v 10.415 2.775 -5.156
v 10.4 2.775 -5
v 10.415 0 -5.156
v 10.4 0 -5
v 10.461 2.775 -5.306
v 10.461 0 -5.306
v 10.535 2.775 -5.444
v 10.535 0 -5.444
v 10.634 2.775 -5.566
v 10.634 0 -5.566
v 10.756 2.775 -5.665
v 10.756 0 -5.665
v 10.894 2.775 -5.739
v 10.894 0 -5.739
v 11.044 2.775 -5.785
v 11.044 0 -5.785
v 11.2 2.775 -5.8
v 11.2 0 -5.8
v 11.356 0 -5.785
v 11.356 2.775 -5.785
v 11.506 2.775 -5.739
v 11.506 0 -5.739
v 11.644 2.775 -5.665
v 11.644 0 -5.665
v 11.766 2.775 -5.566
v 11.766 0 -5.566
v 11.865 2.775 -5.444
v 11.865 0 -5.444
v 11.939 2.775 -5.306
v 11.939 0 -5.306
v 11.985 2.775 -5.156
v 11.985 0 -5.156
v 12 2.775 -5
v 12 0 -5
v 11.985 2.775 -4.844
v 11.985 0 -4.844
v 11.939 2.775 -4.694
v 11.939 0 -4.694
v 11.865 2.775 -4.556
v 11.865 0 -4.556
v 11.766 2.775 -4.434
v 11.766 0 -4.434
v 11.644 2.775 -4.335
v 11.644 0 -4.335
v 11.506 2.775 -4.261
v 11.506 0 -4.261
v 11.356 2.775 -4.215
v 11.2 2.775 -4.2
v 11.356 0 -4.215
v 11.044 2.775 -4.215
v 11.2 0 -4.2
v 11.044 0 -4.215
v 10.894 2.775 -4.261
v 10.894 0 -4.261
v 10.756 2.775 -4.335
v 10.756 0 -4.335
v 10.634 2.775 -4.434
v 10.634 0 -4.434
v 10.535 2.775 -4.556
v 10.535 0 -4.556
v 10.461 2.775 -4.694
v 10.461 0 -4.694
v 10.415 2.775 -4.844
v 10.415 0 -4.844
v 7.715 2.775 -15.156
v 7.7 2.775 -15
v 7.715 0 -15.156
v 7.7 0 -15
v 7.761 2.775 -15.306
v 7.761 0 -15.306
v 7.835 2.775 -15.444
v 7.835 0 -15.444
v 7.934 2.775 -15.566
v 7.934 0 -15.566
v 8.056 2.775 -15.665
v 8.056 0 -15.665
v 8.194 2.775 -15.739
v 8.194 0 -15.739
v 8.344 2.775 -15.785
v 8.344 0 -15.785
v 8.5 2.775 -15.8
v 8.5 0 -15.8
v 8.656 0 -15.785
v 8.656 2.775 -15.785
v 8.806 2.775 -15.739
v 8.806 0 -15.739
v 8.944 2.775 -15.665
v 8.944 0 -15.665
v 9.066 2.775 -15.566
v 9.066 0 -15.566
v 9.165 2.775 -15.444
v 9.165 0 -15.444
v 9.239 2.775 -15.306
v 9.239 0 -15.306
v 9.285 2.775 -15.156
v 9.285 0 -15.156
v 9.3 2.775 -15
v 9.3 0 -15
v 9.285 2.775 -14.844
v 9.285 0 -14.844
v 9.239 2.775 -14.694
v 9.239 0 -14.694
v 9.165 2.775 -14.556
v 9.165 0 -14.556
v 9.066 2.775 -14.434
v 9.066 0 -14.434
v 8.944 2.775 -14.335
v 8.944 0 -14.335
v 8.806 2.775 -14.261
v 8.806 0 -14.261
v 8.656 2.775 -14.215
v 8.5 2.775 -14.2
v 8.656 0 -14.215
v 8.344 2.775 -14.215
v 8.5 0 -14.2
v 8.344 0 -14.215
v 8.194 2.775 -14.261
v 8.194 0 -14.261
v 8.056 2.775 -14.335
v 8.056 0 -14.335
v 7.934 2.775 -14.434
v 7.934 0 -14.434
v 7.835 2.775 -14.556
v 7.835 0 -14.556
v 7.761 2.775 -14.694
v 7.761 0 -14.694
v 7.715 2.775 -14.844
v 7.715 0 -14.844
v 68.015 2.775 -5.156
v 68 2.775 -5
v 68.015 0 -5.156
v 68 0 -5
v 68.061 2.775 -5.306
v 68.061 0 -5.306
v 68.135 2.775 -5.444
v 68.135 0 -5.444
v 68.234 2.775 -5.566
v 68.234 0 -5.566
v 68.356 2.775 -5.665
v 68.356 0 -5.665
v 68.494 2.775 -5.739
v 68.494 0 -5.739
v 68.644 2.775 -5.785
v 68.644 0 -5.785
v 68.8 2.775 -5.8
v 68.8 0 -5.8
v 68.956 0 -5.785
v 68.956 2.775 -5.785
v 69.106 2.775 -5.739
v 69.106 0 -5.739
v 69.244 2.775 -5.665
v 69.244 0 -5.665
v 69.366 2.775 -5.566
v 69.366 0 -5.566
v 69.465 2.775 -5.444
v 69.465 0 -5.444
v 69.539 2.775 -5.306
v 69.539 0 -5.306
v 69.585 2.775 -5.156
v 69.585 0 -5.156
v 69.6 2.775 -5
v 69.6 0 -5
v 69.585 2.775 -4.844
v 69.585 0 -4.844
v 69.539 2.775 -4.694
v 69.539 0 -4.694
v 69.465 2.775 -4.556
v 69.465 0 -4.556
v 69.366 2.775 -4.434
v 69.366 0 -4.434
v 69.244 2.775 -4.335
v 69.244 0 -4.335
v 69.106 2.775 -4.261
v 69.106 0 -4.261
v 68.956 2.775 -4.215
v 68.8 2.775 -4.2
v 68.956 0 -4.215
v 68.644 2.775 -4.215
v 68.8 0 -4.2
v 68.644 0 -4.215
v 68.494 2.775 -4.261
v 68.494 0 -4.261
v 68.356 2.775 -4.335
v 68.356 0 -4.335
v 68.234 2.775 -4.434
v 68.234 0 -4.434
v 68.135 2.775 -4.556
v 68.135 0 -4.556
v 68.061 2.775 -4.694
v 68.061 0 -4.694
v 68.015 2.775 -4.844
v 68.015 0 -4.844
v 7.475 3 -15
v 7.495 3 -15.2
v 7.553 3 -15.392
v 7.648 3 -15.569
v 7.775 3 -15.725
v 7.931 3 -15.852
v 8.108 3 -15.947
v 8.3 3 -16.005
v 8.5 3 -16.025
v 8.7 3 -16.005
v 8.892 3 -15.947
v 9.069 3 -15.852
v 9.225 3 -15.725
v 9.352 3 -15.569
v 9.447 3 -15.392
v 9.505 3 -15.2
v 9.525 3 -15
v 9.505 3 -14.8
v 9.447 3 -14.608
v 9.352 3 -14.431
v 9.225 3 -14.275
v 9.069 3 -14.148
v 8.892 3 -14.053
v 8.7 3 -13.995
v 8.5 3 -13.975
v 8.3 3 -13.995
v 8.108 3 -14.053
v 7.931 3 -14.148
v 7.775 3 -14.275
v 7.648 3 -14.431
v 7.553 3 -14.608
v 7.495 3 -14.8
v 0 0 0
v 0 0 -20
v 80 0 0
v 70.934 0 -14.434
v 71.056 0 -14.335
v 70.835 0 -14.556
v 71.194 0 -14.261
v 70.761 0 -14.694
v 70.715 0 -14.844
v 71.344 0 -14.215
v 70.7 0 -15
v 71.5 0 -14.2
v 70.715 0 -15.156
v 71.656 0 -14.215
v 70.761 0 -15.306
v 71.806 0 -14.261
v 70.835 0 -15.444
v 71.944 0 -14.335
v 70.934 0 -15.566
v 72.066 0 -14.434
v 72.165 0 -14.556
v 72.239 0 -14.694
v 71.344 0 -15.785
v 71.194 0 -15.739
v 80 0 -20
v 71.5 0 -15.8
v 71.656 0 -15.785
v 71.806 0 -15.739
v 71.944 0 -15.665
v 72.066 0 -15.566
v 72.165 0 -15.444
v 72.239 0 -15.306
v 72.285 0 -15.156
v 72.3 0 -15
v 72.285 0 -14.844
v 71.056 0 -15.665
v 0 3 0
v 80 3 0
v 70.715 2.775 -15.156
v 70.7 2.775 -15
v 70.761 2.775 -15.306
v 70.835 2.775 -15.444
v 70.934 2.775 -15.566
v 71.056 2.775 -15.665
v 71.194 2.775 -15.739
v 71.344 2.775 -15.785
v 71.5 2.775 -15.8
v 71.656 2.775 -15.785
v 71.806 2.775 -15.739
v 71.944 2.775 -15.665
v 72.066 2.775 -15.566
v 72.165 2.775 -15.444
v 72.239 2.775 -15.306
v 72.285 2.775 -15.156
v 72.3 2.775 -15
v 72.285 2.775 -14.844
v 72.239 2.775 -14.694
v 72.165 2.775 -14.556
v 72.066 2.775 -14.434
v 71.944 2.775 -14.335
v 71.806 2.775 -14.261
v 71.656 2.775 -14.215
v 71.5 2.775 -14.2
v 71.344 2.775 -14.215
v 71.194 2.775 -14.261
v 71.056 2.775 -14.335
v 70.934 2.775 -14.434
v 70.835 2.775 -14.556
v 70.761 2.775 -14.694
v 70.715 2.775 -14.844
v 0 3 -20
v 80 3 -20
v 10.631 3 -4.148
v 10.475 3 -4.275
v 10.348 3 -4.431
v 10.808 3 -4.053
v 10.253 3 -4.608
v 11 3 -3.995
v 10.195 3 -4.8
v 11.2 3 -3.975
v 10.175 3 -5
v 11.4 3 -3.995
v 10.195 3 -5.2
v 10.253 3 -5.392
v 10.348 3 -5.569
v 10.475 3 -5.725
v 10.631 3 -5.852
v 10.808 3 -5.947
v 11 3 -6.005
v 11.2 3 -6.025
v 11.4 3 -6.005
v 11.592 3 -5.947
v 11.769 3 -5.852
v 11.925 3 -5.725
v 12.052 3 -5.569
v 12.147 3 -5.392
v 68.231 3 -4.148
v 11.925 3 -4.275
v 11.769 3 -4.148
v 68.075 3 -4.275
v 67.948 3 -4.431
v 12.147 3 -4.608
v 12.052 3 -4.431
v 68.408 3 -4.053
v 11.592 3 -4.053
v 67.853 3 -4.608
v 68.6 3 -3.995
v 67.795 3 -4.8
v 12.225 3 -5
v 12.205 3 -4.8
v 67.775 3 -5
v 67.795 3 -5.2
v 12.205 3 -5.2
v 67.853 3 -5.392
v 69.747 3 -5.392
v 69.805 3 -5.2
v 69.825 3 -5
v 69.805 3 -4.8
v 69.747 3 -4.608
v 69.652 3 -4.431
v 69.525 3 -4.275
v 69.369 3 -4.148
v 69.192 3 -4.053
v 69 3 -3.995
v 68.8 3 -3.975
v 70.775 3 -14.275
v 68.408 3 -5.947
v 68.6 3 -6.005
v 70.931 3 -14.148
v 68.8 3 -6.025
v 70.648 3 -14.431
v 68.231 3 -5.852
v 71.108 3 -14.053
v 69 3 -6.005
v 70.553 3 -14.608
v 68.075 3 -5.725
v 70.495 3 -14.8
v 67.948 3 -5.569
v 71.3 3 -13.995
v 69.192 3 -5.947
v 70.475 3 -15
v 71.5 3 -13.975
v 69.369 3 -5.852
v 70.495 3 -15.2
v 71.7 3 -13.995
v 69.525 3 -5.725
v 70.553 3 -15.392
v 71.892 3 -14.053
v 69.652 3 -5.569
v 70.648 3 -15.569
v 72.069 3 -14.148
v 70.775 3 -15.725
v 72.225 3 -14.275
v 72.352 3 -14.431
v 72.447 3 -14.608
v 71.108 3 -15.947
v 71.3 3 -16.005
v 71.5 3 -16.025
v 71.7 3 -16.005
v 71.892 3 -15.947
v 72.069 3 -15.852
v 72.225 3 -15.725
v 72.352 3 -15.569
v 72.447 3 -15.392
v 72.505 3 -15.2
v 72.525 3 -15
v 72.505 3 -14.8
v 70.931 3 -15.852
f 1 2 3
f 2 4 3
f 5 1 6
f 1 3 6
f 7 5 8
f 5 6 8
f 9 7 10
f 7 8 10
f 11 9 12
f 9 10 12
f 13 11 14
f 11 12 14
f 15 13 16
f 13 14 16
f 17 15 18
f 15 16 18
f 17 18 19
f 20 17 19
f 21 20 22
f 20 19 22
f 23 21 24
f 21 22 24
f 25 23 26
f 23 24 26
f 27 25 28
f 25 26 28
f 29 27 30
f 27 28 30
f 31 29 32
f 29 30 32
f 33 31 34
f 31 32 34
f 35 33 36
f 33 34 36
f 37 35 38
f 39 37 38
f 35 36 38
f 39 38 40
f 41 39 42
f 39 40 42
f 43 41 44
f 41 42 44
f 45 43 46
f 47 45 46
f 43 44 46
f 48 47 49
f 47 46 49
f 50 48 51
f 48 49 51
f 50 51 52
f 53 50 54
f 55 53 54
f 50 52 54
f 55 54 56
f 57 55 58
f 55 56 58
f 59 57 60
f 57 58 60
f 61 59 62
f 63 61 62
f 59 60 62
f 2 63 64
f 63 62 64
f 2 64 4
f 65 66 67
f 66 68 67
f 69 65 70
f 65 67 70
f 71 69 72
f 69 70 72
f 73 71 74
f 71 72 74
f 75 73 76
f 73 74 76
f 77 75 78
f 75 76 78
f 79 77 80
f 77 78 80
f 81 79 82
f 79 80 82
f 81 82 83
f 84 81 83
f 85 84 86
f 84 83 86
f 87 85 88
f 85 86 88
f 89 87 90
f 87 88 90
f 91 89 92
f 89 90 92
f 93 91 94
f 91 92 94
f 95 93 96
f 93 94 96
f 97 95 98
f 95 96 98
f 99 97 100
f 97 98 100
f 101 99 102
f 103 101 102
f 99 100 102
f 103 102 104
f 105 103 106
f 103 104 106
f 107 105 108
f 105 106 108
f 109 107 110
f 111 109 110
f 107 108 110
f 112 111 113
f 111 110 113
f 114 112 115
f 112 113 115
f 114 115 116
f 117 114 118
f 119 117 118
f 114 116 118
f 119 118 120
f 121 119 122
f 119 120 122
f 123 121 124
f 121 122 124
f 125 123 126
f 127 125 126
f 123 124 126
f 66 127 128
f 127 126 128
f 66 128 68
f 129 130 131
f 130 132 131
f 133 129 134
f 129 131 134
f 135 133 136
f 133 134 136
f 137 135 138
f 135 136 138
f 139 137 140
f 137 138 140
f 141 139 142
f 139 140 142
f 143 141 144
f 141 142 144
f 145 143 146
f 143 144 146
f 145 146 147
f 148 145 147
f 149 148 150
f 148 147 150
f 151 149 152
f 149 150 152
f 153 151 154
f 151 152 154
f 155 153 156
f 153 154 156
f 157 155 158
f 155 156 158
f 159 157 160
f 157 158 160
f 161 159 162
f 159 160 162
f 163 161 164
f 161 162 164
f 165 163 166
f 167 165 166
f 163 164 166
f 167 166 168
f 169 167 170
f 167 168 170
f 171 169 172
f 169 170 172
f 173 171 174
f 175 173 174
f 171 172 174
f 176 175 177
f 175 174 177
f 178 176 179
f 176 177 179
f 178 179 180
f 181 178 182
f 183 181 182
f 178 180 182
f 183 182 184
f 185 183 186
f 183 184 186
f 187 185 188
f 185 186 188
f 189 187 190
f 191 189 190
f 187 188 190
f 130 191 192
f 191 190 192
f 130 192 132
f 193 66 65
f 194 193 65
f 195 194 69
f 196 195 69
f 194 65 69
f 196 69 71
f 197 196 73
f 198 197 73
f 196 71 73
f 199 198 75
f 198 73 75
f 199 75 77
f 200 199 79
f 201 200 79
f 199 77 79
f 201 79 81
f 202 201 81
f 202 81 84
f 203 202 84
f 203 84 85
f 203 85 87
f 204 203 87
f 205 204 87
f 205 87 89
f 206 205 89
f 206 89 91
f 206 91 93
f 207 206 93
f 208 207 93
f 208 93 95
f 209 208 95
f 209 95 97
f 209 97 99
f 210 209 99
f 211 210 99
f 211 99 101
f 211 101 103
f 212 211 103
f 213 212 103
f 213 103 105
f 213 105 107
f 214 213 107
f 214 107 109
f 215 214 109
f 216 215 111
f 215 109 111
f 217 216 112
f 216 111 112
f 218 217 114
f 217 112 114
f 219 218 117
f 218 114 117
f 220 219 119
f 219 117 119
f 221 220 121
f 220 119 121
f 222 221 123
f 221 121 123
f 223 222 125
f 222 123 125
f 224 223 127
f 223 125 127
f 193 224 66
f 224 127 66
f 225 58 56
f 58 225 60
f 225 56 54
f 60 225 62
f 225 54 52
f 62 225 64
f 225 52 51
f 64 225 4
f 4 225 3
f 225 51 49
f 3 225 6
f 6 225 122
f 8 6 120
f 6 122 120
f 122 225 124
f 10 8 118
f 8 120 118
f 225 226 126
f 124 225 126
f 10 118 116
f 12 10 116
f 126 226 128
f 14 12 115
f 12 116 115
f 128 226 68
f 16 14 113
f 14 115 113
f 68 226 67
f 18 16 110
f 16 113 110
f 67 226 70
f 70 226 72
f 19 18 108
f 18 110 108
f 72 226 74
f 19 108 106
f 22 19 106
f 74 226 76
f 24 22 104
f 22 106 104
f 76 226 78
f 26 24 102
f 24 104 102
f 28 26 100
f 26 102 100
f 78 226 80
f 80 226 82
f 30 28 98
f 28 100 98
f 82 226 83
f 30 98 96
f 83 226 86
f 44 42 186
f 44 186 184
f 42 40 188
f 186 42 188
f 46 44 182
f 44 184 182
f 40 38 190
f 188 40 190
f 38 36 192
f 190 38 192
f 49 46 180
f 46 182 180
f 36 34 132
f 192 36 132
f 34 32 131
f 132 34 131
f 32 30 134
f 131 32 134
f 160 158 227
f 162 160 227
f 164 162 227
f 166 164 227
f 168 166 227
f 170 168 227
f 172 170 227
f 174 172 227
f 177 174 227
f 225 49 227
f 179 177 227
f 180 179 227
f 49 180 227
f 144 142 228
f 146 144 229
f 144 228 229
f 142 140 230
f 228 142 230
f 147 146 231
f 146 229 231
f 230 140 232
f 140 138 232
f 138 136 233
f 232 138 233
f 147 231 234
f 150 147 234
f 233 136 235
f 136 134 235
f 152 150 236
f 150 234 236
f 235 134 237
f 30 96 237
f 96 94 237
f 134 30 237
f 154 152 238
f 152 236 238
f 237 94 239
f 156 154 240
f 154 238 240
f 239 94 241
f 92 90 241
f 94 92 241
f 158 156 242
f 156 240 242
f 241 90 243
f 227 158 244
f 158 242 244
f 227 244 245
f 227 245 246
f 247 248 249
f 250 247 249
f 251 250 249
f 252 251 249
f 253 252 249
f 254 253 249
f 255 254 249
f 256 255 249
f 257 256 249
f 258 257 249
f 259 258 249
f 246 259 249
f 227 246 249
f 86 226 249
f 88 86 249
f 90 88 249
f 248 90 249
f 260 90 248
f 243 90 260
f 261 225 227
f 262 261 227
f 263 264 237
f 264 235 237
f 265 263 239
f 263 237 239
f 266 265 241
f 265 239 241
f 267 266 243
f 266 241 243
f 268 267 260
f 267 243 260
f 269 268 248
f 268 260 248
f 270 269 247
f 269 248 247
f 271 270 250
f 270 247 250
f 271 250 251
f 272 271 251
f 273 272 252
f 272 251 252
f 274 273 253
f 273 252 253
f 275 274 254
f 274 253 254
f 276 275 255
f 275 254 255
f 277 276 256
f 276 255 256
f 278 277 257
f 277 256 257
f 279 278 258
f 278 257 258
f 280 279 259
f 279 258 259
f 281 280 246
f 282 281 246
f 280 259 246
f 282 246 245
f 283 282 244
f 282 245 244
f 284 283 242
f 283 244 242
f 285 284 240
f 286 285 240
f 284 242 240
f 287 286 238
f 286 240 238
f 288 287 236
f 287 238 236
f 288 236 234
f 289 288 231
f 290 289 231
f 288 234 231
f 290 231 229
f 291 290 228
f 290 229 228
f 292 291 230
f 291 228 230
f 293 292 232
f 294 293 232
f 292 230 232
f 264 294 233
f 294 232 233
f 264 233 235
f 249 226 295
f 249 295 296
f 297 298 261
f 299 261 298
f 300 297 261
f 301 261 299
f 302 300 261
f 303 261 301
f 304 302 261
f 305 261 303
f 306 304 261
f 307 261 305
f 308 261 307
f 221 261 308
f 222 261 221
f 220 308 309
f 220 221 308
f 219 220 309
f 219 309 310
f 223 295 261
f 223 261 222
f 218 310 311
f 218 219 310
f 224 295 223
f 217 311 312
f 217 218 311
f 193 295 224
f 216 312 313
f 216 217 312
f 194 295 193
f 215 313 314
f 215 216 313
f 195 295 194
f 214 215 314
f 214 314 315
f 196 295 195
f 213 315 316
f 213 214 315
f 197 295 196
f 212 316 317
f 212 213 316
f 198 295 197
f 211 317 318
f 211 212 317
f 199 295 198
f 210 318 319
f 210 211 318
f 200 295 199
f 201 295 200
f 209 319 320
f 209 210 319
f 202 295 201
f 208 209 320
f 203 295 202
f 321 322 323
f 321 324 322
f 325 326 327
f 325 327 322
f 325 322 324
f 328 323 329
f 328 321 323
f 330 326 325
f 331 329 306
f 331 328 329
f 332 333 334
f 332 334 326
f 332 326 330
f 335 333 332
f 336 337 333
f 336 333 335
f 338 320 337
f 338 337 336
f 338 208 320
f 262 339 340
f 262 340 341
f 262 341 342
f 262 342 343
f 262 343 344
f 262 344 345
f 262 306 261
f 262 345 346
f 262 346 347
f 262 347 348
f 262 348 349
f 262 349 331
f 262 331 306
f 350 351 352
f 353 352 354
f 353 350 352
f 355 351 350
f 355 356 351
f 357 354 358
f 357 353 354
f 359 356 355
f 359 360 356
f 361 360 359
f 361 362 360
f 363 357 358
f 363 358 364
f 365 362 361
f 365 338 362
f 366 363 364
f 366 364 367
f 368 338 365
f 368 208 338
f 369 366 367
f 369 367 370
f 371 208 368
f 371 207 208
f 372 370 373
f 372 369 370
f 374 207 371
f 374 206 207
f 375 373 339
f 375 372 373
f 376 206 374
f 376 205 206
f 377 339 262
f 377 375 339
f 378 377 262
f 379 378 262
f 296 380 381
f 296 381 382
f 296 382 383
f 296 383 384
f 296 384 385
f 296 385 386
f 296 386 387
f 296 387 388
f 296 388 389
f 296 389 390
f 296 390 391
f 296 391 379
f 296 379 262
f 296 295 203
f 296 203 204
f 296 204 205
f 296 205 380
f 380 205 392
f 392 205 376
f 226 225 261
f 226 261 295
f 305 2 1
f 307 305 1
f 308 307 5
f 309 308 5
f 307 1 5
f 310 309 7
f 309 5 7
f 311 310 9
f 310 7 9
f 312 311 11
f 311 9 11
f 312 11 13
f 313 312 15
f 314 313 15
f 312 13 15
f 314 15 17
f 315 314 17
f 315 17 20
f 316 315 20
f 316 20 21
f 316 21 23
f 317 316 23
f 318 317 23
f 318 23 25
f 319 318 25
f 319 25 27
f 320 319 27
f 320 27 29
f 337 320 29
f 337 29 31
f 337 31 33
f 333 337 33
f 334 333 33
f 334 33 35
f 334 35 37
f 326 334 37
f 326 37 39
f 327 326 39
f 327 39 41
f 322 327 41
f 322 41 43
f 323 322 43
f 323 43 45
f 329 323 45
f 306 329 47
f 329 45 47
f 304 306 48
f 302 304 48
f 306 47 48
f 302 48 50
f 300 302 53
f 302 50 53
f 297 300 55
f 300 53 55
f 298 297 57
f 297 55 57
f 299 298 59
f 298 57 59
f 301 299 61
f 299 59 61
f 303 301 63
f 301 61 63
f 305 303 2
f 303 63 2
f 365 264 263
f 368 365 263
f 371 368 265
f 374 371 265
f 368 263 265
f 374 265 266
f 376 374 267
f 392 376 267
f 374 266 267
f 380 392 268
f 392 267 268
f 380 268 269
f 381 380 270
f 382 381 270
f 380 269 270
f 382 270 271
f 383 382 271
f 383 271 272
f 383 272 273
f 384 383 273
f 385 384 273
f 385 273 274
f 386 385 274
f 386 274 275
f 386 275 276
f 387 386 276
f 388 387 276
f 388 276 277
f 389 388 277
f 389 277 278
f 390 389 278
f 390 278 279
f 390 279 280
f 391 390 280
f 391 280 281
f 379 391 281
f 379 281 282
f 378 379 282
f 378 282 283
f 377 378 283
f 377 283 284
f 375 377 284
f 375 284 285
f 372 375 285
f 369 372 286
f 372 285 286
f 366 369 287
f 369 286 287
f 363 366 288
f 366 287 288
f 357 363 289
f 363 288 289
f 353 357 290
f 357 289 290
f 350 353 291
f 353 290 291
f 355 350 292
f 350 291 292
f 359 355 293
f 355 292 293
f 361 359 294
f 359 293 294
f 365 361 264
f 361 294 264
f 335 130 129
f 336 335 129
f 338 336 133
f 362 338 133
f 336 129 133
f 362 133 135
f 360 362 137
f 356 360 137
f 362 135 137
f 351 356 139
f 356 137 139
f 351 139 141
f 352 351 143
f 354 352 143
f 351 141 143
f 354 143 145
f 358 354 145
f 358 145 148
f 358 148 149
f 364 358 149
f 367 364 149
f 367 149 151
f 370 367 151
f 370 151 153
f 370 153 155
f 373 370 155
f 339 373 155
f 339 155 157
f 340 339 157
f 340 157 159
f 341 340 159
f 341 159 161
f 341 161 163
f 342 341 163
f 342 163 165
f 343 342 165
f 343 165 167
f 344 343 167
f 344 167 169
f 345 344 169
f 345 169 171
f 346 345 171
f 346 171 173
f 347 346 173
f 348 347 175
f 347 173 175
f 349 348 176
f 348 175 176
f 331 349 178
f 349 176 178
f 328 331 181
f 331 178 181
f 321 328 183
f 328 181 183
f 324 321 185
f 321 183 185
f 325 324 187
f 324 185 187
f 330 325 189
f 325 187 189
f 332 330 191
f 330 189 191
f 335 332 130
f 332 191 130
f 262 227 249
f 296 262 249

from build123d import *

# Parameters (mm, degrees)
SKETCH_1_W                   = 80
SKETCH_1_H                   = 20
EXTRUDE_1_DEPTH              = 3
HOLE_WIZARD_M2_1_D           = 1.6
HOLE_WIZARD_M2_1_CSINK_D     = 2.05
HOLE_WIZARD_M2_1_CSINK_ANGLE = 90


with BuildPart() as part:
    # 草图1 → 凸台-拉伸1 (new body)
    with BuildSketch(Plane(origin=(0, 0, 0), x_dir=(1, 0, 0), z_dir=(0, 1, 0))):
        with Locations((40, 10)):
            Rectangle(SKETCH_1_W, SKETCH_1_H)
    extrude(amount=EXTRUDE_1_DEPTH)

    # M2 螺纹孔1 (through all)
    with Locations(Plane(origin=(0, 3, 0), x_dir=(1, 0, 0), z_dir=(0, 1, 0))):
        with Locations((8.5, 15), (11.2, 5), (71.5, 15), (68.8, 5)):
            CounterSinkHole(HOLE_WIZARD_M2_1_D / 2, HOLE_WIZARD_M2_1_CSINK_D / 2, counter_sink_angle=HOLE_WIZARD_M2_1_CSINK_ANGLE)


solid = part.part
